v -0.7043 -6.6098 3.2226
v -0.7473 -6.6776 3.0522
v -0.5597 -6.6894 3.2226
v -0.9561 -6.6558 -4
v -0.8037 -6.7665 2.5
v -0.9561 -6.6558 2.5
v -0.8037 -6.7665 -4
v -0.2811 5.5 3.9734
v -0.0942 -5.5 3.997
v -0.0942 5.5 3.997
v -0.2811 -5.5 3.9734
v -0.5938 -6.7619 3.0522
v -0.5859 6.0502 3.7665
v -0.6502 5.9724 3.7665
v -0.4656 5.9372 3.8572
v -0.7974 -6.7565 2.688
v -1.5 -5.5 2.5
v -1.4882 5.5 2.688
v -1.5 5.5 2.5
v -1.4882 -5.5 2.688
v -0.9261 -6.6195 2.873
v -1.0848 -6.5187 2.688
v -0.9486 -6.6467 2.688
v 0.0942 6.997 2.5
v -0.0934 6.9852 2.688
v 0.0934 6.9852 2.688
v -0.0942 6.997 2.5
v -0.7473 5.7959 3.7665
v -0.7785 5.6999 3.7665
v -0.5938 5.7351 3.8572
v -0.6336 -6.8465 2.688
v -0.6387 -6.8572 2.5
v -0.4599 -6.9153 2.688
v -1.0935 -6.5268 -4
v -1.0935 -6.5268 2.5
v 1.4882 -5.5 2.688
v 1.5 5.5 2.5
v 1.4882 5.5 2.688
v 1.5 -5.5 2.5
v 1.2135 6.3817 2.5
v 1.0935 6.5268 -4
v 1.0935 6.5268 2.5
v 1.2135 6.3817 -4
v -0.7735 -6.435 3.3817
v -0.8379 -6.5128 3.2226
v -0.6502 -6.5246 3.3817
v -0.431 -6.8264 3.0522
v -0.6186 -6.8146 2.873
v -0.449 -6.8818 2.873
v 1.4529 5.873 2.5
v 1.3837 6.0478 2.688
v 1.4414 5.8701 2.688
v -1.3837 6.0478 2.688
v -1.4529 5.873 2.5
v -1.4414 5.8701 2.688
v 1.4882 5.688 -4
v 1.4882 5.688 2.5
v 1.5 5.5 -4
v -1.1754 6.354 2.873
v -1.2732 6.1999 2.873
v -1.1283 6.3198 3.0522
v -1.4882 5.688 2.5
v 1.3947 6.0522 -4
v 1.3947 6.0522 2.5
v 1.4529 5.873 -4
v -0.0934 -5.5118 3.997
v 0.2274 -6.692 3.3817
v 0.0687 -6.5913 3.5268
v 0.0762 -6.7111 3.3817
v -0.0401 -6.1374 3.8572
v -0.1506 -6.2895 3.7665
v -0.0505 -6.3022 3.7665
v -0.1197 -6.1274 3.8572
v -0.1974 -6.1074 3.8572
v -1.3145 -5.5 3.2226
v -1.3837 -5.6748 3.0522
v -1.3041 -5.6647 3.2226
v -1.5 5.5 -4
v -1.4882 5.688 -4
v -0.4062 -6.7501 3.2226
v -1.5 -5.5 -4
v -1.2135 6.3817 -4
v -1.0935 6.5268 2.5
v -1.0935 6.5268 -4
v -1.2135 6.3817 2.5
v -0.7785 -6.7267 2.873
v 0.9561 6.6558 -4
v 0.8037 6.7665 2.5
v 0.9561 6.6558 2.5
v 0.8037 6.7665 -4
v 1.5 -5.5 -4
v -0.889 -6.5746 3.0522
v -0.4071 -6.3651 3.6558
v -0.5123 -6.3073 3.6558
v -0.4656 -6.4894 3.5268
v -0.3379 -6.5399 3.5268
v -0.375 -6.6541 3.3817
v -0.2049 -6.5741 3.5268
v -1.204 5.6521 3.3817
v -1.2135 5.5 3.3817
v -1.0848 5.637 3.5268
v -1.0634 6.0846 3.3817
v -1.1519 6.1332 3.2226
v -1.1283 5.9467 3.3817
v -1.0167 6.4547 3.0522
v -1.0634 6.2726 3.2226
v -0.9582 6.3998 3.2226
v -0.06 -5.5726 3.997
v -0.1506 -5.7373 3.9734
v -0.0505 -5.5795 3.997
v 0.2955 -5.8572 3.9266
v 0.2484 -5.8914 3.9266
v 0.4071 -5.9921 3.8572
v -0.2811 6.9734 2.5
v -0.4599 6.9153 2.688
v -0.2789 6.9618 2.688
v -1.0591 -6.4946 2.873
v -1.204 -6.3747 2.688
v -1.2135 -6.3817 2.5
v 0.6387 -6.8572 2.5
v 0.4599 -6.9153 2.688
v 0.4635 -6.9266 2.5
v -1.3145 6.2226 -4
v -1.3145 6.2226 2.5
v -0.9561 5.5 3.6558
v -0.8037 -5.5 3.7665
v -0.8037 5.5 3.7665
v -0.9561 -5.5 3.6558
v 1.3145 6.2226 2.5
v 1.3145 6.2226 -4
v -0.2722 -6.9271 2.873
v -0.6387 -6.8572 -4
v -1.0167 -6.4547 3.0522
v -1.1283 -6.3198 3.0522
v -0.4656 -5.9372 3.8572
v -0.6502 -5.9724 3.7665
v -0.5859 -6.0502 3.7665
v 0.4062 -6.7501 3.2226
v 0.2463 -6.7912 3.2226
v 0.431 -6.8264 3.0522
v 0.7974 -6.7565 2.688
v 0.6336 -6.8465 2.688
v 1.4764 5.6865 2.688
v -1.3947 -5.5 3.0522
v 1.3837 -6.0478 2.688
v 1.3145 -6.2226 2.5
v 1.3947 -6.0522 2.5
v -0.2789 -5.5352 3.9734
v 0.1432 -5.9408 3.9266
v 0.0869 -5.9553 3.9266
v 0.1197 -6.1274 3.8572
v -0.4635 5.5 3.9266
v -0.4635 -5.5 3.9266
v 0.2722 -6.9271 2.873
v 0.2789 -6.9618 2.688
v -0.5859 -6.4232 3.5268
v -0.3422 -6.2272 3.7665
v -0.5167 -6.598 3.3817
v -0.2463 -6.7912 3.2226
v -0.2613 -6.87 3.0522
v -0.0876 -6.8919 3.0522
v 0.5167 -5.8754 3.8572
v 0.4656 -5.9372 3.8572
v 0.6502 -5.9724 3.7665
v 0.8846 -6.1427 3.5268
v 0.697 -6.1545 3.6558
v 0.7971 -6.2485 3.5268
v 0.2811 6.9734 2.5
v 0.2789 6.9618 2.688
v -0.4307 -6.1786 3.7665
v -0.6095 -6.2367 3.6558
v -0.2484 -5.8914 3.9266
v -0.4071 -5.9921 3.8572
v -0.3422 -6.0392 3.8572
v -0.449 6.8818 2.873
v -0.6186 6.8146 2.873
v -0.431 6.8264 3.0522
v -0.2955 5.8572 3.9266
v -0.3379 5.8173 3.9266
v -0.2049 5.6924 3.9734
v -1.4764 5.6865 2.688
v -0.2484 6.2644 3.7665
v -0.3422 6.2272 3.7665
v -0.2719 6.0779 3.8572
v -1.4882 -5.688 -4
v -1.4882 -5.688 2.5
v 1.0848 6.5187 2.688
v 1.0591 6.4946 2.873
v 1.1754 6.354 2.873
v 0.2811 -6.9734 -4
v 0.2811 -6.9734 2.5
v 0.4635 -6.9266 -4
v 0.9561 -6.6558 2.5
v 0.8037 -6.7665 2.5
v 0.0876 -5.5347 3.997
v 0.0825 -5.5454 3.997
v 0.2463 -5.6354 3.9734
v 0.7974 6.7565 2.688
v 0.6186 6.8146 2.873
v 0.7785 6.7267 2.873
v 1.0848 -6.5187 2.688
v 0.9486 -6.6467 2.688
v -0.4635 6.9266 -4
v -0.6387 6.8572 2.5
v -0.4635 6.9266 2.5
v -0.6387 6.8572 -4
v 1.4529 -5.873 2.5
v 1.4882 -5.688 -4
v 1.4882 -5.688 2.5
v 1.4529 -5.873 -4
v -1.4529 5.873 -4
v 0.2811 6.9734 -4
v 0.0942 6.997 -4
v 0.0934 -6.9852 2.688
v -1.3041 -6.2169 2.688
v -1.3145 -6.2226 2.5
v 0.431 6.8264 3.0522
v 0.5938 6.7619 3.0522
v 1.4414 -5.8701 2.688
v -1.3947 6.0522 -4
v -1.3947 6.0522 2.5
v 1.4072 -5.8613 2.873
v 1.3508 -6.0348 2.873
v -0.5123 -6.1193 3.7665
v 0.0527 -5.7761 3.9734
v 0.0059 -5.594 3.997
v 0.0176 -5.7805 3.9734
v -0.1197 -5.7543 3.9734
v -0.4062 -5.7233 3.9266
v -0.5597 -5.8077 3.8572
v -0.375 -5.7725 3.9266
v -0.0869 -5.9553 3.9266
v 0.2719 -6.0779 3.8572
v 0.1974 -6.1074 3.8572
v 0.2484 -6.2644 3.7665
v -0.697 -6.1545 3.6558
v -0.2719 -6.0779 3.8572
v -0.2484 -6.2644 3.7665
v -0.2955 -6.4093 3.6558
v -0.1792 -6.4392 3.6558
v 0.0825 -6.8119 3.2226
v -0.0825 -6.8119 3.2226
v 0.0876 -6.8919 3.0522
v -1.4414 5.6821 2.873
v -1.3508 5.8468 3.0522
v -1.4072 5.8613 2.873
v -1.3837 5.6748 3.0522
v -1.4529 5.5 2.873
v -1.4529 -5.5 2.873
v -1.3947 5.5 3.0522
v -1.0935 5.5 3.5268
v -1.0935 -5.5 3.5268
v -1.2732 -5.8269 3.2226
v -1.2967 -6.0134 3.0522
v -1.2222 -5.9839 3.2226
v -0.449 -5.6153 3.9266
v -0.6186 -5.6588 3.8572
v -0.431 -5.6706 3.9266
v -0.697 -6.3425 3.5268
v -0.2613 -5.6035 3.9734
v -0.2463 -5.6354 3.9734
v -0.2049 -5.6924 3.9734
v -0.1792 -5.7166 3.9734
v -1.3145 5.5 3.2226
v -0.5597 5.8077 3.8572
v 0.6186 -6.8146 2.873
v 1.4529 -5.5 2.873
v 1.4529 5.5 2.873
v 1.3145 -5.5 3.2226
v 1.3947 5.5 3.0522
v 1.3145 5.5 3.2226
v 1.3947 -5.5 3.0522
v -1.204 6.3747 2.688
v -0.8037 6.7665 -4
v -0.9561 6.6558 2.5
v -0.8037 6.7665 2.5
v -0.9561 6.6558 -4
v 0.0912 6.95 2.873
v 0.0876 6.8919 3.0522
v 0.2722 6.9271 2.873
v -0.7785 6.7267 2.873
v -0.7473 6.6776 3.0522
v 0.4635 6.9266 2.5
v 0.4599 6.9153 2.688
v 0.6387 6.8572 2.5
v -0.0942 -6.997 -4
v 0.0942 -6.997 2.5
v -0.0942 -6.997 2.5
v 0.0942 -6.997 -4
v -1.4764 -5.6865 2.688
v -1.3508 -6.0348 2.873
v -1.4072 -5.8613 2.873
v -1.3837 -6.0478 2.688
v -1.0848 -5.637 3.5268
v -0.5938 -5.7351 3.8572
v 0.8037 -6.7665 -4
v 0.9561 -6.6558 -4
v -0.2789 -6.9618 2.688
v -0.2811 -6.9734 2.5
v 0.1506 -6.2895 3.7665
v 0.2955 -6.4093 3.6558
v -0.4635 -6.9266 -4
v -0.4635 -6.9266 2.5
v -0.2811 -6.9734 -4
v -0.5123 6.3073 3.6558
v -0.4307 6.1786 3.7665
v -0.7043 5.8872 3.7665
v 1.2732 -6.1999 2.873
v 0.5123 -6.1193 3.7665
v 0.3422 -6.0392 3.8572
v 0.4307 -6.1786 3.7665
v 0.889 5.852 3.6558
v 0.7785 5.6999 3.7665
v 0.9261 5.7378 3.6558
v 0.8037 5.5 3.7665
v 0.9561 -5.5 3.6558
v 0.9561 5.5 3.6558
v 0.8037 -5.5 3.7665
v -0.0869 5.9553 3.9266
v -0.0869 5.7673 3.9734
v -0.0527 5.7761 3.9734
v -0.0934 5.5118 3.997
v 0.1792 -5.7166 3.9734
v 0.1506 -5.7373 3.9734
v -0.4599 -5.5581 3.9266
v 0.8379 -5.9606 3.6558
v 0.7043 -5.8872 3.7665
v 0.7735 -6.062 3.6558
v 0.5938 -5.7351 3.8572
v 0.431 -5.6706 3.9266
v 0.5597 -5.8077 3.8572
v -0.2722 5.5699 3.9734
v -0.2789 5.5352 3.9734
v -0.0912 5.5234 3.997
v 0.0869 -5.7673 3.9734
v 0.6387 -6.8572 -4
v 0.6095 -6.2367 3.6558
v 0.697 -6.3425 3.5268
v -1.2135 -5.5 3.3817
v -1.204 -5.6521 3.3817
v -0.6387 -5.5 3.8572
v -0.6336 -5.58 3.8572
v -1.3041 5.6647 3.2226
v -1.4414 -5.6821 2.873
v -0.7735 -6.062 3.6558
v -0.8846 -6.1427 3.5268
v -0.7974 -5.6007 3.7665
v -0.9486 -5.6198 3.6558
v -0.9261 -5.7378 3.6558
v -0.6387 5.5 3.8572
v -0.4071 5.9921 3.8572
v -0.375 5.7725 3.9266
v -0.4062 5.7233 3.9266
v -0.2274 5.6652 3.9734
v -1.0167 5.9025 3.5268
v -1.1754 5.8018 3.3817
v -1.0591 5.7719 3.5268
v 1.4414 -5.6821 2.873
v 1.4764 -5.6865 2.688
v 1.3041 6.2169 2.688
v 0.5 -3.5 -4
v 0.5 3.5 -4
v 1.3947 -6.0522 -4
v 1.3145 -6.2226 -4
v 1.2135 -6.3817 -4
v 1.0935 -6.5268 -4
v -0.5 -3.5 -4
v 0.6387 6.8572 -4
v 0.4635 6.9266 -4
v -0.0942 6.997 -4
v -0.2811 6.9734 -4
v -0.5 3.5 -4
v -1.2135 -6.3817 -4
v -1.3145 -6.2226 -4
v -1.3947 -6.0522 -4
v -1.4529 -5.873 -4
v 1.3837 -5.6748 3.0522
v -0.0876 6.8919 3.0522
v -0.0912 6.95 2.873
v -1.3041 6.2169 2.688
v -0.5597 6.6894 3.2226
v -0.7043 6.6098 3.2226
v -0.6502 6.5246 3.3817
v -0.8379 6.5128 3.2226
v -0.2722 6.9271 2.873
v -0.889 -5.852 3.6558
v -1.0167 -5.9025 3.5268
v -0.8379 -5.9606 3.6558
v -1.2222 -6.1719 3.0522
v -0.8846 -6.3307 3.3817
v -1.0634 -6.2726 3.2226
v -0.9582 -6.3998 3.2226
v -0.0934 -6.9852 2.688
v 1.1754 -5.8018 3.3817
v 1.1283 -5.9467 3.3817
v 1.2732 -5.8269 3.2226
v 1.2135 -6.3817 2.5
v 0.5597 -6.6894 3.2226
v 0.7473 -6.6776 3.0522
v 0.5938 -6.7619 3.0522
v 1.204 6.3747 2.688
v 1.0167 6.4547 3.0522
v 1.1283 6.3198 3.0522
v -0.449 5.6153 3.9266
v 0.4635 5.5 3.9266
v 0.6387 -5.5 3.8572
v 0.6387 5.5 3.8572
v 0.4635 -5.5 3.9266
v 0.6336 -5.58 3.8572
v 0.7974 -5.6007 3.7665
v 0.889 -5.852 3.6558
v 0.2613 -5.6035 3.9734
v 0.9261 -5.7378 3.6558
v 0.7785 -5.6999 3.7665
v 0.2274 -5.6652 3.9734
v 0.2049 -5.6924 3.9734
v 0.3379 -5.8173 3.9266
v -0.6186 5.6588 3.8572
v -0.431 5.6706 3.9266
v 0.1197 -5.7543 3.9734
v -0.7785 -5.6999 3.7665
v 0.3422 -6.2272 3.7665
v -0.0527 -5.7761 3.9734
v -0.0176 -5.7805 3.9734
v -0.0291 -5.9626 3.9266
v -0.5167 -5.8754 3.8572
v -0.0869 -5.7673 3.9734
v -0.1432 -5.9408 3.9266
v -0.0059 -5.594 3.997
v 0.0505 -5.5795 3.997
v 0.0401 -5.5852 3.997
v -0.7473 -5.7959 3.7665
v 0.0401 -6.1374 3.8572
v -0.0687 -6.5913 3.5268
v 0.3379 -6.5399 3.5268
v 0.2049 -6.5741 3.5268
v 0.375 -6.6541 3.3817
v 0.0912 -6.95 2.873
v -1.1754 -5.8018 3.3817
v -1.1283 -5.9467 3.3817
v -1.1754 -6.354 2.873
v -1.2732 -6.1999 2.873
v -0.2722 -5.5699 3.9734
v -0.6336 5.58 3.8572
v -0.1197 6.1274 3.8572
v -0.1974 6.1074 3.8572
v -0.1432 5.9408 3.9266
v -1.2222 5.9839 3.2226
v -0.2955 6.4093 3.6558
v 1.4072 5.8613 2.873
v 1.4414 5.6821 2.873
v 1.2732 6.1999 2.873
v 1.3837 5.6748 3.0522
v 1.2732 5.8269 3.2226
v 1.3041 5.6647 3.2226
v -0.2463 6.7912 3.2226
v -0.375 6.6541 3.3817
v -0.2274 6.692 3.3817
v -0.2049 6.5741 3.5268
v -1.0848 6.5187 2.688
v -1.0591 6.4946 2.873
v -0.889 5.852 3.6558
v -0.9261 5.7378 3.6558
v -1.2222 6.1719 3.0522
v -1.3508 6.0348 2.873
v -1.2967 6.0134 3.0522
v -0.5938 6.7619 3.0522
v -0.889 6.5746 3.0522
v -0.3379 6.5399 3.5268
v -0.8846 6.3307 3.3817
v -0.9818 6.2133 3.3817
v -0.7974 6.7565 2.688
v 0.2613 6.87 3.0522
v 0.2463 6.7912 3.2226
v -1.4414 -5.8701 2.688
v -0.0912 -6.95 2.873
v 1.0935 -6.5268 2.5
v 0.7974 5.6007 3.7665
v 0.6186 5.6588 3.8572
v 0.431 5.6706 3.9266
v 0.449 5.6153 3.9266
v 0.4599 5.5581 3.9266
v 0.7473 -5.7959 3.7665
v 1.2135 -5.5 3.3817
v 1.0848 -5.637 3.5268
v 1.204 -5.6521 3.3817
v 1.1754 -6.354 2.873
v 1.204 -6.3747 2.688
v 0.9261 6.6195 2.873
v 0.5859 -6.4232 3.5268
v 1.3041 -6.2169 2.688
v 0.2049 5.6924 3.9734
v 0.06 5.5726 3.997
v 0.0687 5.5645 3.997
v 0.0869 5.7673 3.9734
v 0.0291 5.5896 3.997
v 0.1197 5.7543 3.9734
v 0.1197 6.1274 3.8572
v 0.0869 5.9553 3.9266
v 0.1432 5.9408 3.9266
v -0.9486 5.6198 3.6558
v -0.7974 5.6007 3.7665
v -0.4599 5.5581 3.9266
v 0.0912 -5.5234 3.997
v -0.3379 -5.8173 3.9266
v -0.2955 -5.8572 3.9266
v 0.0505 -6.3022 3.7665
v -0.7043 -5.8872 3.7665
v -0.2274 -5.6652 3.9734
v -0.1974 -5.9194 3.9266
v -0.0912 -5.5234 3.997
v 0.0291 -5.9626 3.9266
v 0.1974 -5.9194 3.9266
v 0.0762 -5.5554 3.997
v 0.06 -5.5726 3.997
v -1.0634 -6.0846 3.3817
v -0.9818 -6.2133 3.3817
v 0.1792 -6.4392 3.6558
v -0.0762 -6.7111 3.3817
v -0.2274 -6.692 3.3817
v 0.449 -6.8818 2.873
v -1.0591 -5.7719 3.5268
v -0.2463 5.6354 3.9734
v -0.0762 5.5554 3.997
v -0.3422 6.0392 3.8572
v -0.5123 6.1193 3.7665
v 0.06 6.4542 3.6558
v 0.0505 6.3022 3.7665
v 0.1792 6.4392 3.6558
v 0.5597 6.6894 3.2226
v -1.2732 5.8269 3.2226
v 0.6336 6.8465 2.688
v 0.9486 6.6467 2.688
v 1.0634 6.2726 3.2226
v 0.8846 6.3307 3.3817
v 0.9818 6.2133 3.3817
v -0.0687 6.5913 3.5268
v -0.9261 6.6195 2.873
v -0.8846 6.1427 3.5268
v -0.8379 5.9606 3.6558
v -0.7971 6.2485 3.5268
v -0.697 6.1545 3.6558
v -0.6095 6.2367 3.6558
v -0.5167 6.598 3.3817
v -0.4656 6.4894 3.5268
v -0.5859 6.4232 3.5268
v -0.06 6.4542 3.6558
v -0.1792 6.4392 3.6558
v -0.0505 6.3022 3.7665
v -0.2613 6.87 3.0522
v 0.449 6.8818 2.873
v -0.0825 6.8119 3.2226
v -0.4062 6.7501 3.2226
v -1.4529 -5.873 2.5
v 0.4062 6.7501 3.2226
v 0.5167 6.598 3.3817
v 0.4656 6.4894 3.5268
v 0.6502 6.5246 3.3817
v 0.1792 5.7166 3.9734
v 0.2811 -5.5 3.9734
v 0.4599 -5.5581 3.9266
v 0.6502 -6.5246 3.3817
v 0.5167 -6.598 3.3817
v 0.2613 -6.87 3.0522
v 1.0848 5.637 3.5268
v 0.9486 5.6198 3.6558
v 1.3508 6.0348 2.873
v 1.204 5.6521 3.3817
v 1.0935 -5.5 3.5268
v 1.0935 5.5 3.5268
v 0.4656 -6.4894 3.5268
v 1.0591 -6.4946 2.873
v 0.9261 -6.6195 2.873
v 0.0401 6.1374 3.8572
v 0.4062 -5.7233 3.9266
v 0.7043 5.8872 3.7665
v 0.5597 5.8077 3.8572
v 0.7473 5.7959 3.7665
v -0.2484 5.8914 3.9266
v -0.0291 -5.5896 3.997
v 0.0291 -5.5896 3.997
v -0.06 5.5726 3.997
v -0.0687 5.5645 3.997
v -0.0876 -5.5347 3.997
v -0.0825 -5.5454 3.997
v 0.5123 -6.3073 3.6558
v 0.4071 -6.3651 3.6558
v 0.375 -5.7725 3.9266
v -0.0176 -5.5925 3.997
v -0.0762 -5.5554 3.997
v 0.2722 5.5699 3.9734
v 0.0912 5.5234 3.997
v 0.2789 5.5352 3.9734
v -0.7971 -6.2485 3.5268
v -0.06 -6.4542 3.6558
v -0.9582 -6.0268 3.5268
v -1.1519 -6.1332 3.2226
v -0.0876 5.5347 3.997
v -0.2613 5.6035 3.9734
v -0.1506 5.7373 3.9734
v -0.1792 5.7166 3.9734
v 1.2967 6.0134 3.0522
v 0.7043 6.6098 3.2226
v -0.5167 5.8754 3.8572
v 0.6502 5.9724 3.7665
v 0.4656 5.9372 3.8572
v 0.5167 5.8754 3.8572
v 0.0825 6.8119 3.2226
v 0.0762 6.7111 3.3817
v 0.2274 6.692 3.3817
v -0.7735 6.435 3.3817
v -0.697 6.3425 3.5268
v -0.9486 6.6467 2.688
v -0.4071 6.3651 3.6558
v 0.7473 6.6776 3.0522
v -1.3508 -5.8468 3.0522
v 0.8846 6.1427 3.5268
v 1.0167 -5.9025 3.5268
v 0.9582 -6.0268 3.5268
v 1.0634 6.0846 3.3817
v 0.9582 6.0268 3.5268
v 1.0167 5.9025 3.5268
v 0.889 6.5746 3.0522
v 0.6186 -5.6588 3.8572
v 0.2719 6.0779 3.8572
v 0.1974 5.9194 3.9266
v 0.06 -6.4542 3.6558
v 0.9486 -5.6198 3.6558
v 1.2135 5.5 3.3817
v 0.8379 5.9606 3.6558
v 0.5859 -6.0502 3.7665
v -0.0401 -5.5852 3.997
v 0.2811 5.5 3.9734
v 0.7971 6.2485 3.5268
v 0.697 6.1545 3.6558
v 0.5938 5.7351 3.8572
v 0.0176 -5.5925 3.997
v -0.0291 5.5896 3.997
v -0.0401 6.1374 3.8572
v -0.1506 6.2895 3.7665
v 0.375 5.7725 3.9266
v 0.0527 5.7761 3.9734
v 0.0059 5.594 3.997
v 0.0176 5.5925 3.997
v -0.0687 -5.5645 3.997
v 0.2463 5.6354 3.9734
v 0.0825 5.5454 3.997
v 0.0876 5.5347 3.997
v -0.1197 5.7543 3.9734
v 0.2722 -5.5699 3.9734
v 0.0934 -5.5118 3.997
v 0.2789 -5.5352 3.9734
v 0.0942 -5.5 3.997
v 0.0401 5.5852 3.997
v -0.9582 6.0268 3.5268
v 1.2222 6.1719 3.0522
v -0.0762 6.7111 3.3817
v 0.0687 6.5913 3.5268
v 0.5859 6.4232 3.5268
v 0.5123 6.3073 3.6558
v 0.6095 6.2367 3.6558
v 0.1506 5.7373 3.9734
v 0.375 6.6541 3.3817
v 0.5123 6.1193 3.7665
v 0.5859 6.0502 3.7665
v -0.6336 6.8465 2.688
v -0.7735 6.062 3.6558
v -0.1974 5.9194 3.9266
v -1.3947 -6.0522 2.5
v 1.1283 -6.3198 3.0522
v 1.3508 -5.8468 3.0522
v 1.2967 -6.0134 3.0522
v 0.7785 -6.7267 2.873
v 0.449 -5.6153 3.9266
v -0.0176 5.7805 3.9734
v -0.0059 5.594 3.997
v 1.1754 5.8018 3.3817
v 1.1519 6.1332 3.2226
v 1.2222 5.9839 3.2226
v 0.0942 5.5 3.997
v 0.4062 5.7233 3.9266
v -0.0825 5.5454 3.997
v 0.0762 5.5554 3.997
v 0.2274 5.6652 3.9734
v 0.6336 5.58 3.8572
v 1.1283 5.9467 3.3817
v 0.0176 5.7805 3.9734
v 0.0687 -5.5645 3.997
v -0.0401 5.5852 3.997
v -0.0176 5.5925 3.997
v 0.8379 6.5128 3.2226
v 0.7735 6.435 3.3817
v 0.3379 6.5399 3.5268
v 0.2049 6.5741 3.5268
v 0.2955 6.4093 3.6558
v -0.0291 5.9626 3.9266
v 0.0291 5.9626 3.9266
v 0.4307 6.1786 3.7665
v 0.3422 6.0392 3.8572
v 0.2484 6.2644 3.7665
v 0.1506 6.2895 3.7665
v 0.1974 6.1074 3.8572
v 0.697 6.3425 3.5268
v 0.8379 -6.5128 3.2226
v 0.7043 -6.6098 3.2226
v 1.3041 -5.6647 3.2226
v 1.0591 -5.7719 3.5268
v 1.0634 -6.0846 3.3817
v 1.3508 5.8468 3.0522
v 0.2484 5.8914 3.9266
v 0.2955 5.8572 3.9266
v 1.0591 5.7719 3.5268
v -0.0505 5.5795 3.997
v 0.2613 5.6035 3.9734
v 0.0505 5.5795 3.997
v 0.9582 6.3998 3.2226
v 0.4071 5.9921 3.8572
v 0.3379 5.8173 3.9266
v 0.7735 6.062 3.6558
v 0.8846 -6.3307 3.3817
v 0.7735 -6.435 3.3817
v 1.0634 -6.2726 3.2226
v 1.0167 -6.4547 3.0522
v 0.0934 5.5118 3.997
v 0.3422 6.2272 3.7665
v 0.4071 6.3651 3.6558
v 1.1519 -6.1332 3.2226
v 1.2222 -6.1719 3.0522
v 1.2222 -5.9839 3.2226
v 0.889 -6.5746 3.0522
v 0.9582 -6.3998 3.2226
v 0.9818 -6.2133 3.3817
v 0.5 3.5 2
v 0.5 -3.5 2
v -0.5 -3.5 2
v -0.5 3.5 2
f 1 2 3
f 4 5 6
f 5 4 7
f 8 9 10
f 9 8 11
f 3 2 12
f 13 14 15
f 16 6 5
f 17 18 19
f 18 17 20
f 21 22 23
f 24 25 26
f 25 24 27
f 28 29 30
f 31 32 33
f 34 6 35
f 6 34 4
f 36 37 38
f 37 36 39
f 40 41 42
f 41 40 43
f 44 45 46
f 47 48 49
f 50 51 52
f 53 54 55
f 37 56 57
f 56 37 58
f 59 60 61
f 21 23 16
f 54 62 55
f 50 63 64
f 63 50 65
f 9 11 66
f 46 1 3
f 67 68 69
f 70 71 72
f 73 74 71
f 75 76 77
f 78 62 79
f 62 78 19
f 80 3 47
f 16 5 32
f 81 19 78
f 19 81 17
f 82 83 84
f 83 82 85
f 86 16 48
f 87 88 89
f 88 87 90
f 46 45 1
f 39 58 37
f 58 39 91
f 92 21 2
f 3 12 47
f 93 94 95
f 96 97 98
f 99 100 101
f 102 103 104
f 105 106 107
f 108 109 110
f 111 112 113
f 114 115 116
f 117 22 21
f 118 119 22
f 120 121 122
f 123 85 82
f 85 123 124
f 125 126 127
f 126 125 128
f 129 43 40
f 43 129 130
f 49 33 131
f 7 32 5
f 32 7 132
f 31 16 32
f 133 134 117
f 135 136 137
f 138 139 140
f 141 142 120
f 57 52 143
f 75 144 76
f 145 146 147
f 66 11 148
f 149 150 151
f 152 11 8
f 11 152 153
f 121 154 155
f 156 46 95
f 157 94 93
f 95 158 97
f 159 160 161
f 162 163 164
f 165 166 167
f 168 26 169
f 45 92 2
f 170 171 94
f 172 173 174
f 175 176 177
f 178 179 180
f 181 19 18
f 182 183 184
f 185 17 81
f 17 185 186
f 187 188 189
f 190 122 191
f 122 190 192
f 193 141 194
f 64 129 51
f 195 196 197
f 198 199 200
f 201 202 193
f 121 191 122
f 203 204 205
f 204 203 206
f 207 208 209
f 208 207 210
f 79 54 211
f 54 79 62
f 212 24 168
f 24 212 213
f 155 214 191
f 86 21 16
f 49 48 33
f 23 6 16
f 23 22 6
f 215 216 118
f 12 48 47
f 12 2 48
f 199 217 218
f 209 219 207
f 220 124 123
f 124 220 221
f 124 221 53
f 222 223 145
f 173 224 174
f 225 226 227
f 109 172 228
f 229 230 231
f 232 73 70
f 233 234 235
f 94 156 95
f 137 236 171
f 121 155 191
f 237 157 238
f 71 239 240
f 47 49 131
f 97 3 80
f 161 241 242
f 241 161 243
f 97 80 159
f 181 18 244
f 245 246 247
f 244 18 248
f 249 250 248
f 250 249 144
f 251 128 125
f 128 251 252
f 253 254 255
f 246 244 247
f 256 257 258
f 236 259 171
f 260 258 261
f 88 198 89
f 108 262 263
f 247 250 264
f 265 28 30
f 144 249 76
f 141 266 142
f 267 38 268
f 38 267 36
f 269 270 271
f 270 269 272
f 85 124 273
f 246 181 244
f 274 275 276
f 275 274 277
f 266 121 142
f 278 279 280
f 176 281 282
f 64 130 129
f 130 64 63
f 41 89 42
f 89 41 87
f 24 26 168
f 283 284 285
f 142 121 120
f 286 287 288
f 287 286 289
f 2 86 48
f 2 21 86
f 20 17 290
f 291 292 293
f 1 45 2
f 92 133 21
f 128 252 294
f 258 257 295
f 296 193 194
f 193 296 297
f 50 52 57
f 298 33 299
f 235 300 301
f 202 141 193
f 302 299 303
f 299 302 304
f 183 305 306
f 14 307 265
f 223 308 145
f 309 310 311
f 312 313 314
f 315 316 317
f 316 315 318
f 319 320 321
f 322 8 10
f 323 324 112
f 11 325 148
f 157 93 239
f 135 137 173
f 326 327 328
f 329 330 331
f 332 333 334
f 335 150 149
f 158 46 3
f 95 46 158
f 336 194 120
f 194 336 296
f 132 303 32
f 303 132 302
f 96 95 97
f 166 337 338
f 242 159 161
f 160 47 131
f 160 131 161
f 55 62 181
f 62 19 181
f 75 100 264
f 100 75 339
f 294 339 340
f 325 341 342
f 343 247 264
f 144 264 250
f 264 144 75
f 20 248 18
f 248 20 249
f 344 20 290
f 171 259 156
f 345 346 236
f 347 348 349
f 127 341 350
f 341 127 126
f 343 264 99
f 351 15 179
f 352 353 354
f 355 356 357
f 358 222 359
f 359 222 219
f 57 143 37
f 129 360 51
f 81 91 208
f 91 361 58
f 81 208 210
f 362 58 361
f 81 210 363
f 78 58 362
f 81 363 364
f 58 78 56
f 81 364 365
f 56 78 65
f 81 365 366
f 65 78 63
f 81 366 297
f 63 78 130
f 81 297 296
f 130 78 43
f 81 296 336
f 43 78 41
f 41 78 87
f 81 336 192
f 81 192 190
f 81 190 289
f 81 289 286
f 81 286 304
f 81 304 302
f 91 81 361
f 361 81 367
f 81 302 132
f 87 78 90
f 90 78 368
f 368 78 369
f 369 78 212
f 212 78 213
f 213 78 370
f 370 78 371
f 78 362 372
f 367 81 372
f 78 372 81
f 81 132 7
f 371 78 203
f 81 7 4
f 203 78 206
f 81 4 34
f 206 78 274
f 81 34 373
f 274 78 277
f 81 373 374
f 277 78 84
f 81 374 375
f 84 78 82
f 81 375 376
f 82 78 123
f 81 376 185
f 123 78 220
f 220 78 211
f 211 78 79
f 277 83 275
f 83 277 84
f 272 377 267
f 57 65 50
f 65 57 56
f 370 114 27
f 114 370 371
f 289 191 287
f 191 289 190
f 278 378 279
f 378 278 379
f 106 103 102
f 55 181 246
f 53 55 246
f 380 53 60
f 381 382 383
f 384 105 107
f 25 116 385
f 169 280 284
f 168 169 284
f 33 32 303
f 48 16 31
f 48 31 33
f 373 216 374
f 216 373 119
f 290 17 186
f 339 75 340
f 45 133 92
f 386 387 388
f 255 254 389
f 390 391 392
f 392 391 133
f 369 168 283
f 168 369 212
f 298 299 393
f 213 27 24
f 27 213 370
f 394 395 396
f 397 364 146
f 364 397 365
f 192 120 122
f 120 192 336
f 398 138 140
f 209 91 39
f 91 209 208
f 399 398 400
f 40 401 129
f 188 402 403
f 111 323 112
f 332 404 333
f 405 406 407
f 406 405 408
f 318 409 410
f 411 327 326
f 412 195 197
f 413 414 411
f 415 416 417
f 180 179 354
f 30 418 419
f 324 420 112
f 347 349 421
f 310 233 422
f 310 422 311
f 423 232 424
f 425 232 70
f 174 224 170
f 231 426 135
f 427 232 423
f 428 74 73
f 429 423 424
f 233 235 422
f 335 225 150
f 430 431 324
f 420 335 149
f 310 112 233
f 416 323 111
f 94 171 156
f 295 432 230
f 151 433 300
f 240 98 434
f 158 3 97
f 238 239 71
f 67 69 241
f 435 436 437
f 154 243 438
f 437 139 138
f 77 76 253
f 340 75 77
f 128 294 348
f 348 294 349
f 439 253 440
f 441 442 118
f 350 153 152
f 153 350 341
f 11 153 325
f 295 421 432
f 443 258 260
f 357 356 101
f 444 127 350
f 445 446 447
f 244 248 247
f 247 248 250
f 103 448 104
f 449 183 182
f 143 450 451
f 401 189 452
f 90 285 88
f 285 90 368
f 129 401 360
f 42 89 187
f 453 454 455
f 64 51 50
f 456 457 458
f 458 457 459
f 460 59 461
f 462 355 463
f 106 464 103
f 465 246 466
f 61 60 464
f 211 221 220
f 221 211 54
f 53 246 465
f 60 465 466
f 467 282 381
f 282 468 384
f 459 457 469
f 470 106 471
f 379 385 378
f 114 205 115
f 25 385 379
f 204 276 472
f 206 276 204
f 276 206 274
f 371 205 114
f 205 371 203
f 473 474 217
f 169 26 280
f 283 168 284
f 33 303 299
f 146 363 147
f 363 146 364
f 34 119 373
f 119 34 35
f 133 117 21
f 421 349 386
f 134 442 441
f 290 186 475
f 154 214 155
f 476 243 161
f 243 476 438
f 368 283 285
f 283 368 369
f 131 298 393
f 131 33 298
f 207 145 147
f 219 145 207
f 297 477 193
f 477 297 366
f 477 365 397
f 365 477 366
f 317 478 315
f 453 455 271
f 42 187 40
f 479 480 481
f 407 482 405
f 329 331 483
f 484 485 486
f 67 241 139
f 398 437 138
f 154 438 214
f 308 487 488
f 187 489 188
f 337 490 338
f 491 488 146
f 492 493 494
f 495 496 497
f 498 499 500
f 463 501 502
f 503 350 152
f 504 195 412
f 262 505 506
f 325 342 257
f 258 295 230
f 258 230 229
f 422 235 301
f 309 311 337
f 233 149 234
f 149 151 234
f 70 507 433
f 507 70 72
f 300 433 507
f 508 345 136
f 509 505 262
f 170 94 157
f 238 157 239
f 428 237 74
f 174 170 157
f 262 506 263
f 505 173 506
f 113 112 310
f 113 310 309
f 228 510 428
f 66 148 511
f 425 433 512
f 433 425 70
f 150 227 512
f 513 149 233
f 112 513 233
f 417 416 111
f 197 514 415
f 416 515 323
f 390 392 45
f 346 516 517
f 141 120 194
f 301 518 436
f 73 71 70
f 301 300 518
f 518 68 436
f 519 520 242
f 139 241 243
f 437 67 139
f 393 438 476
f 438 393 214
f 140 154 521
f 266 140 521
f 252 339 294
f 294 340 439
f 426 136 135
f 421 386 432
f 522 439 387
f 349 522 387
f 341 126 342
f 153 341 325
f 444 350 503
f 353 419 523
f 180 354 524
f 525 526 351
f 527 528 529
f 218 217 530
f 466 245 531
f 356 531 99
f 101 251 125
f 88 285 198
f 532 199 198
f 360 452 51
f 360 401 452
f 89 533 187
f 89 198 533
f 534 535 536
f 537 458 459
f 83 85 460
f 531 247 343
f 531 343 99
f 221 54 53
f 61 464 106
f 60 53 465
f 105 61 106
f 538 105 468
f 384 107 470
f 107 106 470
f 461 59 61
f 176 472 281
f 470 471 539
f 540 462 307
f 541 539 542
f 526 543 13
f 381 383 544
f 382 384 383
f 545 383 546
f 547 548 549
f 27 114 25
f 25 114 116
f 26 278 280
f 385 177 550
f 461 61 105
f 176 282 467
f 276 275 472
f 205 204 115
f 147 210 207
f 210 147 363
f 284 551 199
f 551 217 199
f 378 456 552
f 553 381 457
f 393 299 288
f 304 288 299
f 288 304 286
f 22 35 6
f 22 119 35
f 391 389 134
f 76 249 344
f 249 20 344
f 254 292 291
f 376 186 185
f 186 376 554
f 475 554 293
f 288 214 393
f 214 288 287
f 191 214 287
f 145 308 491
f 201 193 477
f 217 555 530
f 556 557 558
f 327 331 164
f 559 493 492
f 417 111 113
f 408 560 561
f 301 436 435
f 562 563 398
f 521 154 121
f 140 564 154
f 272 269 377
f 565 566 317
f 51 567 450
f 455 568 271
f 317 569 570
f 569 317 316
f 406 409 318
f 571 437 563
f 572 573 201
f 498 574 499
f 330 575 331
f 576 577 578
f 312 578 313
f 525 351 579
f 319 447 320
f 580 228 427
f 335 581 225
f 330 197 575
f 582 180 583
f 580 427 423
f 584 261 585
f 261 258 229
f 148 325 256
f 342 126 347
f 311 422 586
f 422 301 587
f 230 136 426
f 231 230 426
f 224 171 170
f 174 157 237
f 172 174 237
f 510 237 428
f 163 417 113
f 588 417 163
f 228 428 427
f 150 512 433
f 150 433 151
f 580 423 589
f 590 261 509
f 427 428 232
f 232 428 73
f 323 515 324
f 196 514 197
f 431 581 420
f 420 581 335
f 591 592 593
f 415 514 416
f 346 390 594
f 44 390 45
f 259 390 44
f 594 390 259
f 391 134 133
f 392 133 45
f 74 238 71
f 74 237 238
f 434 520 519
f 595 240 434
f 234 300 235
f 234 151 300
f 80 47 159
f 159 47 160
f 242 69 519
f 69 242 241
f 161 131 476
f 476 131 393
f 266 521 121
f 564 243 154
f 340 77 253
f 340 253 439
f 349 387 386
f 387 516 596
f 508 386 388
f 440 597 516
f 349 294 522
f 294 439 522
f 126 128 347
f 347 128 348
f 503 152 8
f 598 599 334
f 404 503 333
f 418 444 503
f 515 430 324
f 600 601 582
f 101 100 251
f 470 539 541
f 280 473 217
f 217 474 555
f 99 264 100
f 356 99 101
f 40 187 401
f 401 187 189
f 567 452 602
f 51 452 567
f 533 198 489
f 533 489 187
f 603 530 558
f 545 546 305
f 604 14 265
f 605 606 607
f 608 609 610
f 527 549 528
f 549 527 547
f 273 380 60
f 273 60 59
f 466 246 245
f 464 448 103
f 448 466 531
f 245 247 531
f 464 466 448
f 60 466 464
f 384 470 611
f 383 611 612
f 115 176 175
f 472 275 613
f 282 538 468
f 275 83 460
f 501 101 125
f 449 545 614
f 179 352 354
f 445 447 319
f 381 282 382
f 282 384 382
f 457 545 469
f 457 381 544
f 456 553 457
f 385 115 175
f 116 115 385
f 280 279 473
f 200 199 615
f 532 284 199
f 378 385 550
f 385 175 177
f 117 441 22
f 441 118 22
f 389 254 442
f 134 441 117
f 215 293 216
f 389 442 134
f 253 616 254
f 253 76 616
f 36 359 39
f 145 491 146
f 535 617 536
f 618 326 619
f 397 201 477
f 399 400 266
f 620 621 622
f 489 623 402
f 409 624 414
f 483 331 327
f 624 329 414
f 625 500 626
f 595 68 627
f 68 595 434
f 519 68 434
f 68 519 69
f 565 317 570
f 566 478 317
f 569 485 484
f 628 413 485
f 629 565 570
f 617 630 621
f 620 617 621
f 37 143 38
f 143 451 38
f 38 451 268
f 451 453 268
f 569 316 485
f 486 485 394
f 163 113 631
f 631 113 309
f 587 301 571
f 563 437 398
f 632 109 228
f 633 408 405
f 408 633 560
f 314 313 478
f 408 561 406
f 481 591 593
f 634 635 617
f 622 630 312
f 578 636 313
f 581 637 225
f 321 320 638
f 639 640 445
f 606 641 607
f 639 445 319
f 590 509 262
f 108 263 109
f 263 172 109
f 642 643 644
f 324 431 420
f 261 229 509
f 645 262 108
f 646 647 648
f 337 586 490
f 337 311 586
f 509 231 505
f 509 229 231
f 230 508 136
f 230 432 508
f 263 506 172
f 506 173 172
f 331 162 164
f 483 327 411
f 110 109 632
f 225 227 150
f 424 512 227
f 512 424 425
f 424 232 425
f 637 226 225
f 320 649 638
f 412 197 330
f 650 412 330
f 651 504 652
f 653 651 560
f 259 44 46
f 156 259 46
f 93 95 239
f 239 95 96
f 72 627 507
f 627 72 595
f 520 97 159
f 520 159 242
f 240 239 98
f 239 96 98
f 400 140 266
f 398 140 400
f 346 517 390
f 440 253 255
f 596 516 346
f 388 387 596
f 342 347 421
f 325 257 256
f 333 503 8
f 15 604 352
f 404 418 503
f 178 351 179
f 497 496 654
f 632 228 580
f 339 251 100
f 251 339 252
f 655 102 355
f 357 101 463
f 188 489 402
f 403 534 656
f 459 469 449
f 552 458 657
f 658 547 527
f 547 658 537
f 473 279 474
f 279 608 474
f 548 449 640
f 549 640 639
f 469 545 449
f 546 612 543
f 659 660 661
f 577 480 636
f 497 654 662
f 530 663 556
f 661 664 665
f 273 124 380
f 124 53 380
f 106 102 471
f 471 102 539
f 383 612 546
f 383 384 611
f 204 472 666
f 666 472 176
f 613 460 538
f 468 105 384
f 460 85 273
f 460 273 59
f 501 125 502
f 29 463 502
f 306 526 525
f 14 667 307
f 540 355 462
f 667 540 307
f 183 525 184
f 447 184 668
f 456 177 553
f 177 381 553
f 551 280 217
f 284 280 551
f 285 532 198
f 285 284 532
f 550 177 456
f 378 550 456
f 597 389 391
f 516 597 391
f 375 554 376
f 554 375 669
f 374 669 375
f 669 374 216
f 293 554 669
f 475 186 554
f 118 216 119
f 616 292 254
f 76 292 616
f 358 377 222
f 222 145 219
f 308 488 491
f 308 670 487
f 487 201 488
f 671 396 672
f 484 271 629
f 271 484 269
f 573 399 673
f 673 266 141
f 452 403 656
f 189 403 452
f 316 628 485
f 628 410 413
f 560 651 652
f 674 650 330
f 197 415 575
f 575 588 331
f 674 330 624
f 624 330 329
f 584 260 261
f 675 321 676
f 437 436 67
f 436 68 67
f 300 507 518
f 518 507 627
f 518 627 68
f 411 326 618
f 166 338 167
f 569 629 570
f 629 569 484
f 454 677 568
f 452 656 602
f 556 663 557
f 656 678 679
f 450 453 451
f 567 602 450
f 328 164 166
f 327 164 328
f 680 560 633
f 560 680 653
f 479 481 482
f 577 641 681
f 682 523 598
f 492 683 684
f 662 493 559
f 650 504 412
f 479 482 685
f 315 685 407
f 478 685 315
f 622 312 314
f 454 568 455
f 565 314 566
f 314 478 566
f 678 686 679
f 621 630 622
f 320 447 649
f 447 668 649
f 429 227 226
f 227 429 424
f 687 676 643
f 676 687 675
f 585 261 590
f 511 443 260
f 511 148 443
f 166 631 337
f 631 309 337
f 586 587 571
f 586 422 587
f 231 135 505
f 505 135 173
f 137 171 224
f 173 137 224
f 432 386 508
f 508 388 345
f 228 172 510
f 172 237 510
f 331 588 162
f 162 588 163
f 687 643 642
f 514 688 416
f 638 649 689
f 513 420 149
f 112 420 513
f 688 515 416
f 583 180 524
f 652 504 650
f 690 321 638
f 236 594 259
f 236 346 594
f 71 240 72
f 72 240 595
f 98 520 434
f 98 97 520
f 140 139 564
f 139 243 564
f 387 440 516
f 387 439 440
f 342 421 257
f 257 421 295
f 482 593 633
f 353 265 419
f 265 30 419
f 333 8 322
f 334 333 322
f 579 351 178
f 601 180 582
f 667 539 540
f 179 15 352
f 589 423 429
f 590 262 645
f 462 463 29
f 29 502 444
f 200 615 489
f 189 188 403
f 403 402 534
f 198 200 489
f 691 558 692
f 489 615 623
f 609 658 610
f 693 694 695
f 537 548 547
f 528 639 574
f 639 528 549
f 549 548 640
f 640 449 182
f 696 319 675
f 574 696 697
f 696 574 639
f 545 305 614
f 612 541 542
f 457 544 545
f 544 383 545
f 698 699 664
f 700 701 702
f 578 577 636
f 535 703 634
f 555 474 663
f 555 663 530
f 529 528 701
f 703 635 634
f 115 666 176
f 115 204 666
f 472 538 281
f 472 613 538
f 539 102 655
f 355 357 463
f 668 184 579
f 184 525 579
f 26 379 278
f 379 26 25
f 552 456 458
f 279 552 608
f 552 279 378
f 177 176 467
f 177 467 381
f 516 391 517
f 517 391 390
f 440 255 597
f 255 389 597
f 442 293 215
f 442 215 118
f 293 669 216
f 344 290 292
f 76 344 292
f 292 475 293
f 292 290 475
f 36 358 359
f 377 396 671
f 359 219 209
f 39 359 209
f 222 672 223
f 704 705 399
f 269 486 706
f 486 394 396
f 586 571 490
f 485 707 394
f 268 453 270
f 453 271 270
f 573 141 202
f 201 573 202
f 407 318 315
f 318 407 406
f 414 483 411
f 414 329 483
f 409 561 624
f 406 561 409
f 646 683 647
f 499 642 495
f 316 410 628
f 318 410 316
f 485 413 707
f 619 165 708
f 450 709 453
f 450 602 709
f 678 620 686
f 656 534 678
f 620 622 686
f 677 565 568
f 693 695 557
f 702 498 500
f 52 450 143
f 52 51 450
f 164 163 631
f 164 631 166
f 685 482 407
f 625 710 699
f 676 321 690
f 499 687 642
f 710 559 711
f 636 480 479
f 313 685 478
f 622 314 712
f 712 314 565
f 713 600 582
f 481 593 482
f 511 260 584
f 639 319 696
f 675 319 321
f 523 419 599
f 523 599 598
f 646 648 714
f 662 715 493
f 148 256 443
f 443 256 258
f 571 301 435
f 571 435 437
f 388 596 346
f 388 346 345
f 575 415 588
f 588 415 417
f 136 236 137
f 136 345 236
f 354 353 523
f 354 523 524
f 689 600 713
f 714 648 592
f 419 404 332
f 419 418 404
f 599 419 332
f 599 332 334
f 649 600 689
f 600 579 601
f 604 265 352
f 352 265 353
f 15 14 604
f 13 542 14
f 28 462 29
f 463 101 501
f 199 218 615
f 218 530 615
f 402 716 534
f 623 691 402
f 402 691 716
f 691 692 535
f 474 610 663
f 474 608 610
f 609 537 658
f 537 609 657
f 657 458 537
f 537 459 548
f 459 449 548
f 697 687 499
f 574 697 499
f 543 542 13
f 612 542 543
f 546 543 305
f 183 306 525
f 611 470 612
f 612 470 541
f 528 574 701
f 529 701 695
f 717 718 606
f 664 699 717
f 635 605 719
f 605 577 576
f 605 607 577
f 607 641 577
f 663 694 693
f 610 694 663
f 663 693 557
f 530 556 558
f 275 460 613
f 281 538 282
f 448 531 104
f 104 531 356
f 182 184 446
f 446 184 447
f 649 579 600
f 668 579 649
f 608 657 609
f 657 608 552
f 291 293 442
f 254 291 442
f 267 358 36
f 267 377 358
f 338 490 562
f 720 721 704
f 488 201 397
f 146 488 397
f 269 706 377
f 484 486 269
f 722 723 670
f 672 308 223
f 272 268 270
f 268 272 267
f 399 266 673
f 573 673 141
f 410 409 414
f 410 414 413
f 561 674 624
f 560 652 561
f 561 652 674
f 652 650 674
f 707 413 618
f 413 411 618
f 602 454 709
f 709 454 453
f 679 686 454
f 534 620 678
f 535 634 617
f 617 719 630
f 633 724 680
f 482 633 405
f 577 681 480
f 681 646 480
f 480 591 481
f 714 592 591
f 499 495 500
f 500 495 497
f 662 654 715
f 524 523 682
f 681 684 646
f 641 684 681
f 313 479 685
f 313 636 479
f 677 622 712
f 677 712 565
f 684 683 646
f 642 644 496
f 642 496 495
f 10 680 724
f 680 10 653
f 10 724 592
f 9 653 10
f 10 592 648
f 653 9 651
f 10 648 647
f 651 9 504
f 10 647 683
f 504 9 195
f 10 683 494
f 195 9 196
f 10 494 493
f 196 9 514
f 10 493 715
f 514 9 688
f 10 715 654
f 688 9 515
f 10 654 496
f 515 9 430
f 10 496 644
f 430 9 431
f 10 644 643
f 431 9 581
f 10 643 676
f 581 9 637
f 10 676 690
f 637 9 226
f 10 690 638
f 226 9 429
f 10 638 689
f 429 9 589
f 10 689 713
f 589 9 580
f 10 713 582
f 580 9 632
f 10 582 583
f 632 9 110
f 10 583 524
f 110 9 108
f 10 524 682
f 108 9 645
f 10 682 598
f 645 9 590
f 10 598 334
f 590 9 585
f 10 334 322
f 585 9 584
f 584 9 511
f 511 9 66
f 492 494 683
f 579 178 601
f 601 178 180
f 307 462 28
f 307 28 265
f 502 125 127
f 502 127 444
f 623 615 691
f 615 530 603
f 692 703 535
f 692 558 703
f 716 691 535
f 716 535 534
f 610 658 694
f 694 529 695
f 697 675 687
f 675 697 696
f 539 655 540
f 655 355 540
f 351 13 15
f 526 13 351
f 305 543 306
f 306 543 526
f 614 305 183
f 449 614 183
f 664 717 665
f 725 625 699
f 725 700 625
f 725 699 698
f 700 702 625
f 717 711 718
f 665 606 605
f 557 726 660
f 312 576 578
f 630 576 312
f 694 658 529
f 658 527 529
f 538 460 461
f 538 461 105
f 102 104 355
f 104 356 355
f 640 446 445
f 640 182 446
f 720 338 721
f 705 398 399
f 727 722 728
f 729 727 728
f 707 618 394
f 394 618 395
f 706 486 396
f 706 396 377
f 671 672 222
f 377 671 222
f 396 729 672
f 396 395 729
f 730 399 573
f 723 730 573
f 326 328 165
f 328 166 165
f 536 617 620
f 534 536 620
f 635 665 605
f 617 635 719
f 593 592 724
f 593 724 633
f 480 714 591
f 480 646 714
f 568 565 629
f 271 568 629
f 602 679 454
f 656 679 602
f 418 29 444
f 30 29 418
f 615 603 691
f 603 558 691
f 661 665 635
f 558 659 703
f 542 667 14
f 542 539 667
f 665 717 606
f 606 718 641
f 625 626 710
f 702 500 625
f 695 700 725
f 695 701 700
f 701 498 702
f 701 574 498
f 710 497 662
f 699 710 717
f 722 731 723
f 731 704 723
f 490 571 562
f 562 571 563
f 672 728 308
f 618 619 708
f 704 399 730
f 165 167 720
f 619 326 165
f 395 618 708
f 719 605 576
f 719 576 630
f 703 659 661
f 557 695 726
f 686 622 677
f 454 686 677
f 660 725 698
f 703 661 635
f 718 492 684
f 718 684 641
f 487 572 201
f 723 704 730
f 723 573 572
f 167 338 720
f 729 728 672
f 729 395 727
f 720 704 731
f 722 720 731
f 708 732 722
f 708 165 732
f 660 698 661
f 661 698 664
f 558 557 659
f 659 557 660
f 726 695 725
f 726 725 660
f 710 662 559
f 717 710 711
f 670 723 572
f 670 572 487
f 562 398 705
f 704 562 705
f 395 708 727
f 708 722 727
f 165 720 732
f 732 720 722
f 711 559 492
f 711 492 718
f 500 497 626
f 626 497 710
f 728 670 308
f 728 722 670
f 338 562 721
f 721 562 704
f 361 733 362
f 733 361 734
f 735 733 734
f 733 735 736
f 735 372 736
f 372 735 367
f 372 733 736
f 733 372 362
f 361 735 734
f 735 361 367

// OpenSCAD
width=3;
length=14;
height=8;
tab_width=1;
tab_length=7;
tab_height=6;
resolution=50;

$fn=resolution;

difference(){
  hull(){
    cube ([width,length-width*2,height-width],center=true);
    translate ([0,-length/2+width/2,height/2-width/2])
      sphere (r=width/2,center=true);  
    translate ([0,length/2-width/2,height/2-width/2])
      sphere (r=width/2,center=true);  
    translate ([0,-length/2+width/2,-height/2+.5])
      cylinder (r=width/2,h=1,center=true);
    translate ([0,length/2-width/2,-height/2+.5])
      cylinder (r=width/2,h=1,center=true);  
}
  translate ([0,0,(tab_height-height)/2])
    cube ([tab_width,tab_length,tab_height],center=true);  
}
